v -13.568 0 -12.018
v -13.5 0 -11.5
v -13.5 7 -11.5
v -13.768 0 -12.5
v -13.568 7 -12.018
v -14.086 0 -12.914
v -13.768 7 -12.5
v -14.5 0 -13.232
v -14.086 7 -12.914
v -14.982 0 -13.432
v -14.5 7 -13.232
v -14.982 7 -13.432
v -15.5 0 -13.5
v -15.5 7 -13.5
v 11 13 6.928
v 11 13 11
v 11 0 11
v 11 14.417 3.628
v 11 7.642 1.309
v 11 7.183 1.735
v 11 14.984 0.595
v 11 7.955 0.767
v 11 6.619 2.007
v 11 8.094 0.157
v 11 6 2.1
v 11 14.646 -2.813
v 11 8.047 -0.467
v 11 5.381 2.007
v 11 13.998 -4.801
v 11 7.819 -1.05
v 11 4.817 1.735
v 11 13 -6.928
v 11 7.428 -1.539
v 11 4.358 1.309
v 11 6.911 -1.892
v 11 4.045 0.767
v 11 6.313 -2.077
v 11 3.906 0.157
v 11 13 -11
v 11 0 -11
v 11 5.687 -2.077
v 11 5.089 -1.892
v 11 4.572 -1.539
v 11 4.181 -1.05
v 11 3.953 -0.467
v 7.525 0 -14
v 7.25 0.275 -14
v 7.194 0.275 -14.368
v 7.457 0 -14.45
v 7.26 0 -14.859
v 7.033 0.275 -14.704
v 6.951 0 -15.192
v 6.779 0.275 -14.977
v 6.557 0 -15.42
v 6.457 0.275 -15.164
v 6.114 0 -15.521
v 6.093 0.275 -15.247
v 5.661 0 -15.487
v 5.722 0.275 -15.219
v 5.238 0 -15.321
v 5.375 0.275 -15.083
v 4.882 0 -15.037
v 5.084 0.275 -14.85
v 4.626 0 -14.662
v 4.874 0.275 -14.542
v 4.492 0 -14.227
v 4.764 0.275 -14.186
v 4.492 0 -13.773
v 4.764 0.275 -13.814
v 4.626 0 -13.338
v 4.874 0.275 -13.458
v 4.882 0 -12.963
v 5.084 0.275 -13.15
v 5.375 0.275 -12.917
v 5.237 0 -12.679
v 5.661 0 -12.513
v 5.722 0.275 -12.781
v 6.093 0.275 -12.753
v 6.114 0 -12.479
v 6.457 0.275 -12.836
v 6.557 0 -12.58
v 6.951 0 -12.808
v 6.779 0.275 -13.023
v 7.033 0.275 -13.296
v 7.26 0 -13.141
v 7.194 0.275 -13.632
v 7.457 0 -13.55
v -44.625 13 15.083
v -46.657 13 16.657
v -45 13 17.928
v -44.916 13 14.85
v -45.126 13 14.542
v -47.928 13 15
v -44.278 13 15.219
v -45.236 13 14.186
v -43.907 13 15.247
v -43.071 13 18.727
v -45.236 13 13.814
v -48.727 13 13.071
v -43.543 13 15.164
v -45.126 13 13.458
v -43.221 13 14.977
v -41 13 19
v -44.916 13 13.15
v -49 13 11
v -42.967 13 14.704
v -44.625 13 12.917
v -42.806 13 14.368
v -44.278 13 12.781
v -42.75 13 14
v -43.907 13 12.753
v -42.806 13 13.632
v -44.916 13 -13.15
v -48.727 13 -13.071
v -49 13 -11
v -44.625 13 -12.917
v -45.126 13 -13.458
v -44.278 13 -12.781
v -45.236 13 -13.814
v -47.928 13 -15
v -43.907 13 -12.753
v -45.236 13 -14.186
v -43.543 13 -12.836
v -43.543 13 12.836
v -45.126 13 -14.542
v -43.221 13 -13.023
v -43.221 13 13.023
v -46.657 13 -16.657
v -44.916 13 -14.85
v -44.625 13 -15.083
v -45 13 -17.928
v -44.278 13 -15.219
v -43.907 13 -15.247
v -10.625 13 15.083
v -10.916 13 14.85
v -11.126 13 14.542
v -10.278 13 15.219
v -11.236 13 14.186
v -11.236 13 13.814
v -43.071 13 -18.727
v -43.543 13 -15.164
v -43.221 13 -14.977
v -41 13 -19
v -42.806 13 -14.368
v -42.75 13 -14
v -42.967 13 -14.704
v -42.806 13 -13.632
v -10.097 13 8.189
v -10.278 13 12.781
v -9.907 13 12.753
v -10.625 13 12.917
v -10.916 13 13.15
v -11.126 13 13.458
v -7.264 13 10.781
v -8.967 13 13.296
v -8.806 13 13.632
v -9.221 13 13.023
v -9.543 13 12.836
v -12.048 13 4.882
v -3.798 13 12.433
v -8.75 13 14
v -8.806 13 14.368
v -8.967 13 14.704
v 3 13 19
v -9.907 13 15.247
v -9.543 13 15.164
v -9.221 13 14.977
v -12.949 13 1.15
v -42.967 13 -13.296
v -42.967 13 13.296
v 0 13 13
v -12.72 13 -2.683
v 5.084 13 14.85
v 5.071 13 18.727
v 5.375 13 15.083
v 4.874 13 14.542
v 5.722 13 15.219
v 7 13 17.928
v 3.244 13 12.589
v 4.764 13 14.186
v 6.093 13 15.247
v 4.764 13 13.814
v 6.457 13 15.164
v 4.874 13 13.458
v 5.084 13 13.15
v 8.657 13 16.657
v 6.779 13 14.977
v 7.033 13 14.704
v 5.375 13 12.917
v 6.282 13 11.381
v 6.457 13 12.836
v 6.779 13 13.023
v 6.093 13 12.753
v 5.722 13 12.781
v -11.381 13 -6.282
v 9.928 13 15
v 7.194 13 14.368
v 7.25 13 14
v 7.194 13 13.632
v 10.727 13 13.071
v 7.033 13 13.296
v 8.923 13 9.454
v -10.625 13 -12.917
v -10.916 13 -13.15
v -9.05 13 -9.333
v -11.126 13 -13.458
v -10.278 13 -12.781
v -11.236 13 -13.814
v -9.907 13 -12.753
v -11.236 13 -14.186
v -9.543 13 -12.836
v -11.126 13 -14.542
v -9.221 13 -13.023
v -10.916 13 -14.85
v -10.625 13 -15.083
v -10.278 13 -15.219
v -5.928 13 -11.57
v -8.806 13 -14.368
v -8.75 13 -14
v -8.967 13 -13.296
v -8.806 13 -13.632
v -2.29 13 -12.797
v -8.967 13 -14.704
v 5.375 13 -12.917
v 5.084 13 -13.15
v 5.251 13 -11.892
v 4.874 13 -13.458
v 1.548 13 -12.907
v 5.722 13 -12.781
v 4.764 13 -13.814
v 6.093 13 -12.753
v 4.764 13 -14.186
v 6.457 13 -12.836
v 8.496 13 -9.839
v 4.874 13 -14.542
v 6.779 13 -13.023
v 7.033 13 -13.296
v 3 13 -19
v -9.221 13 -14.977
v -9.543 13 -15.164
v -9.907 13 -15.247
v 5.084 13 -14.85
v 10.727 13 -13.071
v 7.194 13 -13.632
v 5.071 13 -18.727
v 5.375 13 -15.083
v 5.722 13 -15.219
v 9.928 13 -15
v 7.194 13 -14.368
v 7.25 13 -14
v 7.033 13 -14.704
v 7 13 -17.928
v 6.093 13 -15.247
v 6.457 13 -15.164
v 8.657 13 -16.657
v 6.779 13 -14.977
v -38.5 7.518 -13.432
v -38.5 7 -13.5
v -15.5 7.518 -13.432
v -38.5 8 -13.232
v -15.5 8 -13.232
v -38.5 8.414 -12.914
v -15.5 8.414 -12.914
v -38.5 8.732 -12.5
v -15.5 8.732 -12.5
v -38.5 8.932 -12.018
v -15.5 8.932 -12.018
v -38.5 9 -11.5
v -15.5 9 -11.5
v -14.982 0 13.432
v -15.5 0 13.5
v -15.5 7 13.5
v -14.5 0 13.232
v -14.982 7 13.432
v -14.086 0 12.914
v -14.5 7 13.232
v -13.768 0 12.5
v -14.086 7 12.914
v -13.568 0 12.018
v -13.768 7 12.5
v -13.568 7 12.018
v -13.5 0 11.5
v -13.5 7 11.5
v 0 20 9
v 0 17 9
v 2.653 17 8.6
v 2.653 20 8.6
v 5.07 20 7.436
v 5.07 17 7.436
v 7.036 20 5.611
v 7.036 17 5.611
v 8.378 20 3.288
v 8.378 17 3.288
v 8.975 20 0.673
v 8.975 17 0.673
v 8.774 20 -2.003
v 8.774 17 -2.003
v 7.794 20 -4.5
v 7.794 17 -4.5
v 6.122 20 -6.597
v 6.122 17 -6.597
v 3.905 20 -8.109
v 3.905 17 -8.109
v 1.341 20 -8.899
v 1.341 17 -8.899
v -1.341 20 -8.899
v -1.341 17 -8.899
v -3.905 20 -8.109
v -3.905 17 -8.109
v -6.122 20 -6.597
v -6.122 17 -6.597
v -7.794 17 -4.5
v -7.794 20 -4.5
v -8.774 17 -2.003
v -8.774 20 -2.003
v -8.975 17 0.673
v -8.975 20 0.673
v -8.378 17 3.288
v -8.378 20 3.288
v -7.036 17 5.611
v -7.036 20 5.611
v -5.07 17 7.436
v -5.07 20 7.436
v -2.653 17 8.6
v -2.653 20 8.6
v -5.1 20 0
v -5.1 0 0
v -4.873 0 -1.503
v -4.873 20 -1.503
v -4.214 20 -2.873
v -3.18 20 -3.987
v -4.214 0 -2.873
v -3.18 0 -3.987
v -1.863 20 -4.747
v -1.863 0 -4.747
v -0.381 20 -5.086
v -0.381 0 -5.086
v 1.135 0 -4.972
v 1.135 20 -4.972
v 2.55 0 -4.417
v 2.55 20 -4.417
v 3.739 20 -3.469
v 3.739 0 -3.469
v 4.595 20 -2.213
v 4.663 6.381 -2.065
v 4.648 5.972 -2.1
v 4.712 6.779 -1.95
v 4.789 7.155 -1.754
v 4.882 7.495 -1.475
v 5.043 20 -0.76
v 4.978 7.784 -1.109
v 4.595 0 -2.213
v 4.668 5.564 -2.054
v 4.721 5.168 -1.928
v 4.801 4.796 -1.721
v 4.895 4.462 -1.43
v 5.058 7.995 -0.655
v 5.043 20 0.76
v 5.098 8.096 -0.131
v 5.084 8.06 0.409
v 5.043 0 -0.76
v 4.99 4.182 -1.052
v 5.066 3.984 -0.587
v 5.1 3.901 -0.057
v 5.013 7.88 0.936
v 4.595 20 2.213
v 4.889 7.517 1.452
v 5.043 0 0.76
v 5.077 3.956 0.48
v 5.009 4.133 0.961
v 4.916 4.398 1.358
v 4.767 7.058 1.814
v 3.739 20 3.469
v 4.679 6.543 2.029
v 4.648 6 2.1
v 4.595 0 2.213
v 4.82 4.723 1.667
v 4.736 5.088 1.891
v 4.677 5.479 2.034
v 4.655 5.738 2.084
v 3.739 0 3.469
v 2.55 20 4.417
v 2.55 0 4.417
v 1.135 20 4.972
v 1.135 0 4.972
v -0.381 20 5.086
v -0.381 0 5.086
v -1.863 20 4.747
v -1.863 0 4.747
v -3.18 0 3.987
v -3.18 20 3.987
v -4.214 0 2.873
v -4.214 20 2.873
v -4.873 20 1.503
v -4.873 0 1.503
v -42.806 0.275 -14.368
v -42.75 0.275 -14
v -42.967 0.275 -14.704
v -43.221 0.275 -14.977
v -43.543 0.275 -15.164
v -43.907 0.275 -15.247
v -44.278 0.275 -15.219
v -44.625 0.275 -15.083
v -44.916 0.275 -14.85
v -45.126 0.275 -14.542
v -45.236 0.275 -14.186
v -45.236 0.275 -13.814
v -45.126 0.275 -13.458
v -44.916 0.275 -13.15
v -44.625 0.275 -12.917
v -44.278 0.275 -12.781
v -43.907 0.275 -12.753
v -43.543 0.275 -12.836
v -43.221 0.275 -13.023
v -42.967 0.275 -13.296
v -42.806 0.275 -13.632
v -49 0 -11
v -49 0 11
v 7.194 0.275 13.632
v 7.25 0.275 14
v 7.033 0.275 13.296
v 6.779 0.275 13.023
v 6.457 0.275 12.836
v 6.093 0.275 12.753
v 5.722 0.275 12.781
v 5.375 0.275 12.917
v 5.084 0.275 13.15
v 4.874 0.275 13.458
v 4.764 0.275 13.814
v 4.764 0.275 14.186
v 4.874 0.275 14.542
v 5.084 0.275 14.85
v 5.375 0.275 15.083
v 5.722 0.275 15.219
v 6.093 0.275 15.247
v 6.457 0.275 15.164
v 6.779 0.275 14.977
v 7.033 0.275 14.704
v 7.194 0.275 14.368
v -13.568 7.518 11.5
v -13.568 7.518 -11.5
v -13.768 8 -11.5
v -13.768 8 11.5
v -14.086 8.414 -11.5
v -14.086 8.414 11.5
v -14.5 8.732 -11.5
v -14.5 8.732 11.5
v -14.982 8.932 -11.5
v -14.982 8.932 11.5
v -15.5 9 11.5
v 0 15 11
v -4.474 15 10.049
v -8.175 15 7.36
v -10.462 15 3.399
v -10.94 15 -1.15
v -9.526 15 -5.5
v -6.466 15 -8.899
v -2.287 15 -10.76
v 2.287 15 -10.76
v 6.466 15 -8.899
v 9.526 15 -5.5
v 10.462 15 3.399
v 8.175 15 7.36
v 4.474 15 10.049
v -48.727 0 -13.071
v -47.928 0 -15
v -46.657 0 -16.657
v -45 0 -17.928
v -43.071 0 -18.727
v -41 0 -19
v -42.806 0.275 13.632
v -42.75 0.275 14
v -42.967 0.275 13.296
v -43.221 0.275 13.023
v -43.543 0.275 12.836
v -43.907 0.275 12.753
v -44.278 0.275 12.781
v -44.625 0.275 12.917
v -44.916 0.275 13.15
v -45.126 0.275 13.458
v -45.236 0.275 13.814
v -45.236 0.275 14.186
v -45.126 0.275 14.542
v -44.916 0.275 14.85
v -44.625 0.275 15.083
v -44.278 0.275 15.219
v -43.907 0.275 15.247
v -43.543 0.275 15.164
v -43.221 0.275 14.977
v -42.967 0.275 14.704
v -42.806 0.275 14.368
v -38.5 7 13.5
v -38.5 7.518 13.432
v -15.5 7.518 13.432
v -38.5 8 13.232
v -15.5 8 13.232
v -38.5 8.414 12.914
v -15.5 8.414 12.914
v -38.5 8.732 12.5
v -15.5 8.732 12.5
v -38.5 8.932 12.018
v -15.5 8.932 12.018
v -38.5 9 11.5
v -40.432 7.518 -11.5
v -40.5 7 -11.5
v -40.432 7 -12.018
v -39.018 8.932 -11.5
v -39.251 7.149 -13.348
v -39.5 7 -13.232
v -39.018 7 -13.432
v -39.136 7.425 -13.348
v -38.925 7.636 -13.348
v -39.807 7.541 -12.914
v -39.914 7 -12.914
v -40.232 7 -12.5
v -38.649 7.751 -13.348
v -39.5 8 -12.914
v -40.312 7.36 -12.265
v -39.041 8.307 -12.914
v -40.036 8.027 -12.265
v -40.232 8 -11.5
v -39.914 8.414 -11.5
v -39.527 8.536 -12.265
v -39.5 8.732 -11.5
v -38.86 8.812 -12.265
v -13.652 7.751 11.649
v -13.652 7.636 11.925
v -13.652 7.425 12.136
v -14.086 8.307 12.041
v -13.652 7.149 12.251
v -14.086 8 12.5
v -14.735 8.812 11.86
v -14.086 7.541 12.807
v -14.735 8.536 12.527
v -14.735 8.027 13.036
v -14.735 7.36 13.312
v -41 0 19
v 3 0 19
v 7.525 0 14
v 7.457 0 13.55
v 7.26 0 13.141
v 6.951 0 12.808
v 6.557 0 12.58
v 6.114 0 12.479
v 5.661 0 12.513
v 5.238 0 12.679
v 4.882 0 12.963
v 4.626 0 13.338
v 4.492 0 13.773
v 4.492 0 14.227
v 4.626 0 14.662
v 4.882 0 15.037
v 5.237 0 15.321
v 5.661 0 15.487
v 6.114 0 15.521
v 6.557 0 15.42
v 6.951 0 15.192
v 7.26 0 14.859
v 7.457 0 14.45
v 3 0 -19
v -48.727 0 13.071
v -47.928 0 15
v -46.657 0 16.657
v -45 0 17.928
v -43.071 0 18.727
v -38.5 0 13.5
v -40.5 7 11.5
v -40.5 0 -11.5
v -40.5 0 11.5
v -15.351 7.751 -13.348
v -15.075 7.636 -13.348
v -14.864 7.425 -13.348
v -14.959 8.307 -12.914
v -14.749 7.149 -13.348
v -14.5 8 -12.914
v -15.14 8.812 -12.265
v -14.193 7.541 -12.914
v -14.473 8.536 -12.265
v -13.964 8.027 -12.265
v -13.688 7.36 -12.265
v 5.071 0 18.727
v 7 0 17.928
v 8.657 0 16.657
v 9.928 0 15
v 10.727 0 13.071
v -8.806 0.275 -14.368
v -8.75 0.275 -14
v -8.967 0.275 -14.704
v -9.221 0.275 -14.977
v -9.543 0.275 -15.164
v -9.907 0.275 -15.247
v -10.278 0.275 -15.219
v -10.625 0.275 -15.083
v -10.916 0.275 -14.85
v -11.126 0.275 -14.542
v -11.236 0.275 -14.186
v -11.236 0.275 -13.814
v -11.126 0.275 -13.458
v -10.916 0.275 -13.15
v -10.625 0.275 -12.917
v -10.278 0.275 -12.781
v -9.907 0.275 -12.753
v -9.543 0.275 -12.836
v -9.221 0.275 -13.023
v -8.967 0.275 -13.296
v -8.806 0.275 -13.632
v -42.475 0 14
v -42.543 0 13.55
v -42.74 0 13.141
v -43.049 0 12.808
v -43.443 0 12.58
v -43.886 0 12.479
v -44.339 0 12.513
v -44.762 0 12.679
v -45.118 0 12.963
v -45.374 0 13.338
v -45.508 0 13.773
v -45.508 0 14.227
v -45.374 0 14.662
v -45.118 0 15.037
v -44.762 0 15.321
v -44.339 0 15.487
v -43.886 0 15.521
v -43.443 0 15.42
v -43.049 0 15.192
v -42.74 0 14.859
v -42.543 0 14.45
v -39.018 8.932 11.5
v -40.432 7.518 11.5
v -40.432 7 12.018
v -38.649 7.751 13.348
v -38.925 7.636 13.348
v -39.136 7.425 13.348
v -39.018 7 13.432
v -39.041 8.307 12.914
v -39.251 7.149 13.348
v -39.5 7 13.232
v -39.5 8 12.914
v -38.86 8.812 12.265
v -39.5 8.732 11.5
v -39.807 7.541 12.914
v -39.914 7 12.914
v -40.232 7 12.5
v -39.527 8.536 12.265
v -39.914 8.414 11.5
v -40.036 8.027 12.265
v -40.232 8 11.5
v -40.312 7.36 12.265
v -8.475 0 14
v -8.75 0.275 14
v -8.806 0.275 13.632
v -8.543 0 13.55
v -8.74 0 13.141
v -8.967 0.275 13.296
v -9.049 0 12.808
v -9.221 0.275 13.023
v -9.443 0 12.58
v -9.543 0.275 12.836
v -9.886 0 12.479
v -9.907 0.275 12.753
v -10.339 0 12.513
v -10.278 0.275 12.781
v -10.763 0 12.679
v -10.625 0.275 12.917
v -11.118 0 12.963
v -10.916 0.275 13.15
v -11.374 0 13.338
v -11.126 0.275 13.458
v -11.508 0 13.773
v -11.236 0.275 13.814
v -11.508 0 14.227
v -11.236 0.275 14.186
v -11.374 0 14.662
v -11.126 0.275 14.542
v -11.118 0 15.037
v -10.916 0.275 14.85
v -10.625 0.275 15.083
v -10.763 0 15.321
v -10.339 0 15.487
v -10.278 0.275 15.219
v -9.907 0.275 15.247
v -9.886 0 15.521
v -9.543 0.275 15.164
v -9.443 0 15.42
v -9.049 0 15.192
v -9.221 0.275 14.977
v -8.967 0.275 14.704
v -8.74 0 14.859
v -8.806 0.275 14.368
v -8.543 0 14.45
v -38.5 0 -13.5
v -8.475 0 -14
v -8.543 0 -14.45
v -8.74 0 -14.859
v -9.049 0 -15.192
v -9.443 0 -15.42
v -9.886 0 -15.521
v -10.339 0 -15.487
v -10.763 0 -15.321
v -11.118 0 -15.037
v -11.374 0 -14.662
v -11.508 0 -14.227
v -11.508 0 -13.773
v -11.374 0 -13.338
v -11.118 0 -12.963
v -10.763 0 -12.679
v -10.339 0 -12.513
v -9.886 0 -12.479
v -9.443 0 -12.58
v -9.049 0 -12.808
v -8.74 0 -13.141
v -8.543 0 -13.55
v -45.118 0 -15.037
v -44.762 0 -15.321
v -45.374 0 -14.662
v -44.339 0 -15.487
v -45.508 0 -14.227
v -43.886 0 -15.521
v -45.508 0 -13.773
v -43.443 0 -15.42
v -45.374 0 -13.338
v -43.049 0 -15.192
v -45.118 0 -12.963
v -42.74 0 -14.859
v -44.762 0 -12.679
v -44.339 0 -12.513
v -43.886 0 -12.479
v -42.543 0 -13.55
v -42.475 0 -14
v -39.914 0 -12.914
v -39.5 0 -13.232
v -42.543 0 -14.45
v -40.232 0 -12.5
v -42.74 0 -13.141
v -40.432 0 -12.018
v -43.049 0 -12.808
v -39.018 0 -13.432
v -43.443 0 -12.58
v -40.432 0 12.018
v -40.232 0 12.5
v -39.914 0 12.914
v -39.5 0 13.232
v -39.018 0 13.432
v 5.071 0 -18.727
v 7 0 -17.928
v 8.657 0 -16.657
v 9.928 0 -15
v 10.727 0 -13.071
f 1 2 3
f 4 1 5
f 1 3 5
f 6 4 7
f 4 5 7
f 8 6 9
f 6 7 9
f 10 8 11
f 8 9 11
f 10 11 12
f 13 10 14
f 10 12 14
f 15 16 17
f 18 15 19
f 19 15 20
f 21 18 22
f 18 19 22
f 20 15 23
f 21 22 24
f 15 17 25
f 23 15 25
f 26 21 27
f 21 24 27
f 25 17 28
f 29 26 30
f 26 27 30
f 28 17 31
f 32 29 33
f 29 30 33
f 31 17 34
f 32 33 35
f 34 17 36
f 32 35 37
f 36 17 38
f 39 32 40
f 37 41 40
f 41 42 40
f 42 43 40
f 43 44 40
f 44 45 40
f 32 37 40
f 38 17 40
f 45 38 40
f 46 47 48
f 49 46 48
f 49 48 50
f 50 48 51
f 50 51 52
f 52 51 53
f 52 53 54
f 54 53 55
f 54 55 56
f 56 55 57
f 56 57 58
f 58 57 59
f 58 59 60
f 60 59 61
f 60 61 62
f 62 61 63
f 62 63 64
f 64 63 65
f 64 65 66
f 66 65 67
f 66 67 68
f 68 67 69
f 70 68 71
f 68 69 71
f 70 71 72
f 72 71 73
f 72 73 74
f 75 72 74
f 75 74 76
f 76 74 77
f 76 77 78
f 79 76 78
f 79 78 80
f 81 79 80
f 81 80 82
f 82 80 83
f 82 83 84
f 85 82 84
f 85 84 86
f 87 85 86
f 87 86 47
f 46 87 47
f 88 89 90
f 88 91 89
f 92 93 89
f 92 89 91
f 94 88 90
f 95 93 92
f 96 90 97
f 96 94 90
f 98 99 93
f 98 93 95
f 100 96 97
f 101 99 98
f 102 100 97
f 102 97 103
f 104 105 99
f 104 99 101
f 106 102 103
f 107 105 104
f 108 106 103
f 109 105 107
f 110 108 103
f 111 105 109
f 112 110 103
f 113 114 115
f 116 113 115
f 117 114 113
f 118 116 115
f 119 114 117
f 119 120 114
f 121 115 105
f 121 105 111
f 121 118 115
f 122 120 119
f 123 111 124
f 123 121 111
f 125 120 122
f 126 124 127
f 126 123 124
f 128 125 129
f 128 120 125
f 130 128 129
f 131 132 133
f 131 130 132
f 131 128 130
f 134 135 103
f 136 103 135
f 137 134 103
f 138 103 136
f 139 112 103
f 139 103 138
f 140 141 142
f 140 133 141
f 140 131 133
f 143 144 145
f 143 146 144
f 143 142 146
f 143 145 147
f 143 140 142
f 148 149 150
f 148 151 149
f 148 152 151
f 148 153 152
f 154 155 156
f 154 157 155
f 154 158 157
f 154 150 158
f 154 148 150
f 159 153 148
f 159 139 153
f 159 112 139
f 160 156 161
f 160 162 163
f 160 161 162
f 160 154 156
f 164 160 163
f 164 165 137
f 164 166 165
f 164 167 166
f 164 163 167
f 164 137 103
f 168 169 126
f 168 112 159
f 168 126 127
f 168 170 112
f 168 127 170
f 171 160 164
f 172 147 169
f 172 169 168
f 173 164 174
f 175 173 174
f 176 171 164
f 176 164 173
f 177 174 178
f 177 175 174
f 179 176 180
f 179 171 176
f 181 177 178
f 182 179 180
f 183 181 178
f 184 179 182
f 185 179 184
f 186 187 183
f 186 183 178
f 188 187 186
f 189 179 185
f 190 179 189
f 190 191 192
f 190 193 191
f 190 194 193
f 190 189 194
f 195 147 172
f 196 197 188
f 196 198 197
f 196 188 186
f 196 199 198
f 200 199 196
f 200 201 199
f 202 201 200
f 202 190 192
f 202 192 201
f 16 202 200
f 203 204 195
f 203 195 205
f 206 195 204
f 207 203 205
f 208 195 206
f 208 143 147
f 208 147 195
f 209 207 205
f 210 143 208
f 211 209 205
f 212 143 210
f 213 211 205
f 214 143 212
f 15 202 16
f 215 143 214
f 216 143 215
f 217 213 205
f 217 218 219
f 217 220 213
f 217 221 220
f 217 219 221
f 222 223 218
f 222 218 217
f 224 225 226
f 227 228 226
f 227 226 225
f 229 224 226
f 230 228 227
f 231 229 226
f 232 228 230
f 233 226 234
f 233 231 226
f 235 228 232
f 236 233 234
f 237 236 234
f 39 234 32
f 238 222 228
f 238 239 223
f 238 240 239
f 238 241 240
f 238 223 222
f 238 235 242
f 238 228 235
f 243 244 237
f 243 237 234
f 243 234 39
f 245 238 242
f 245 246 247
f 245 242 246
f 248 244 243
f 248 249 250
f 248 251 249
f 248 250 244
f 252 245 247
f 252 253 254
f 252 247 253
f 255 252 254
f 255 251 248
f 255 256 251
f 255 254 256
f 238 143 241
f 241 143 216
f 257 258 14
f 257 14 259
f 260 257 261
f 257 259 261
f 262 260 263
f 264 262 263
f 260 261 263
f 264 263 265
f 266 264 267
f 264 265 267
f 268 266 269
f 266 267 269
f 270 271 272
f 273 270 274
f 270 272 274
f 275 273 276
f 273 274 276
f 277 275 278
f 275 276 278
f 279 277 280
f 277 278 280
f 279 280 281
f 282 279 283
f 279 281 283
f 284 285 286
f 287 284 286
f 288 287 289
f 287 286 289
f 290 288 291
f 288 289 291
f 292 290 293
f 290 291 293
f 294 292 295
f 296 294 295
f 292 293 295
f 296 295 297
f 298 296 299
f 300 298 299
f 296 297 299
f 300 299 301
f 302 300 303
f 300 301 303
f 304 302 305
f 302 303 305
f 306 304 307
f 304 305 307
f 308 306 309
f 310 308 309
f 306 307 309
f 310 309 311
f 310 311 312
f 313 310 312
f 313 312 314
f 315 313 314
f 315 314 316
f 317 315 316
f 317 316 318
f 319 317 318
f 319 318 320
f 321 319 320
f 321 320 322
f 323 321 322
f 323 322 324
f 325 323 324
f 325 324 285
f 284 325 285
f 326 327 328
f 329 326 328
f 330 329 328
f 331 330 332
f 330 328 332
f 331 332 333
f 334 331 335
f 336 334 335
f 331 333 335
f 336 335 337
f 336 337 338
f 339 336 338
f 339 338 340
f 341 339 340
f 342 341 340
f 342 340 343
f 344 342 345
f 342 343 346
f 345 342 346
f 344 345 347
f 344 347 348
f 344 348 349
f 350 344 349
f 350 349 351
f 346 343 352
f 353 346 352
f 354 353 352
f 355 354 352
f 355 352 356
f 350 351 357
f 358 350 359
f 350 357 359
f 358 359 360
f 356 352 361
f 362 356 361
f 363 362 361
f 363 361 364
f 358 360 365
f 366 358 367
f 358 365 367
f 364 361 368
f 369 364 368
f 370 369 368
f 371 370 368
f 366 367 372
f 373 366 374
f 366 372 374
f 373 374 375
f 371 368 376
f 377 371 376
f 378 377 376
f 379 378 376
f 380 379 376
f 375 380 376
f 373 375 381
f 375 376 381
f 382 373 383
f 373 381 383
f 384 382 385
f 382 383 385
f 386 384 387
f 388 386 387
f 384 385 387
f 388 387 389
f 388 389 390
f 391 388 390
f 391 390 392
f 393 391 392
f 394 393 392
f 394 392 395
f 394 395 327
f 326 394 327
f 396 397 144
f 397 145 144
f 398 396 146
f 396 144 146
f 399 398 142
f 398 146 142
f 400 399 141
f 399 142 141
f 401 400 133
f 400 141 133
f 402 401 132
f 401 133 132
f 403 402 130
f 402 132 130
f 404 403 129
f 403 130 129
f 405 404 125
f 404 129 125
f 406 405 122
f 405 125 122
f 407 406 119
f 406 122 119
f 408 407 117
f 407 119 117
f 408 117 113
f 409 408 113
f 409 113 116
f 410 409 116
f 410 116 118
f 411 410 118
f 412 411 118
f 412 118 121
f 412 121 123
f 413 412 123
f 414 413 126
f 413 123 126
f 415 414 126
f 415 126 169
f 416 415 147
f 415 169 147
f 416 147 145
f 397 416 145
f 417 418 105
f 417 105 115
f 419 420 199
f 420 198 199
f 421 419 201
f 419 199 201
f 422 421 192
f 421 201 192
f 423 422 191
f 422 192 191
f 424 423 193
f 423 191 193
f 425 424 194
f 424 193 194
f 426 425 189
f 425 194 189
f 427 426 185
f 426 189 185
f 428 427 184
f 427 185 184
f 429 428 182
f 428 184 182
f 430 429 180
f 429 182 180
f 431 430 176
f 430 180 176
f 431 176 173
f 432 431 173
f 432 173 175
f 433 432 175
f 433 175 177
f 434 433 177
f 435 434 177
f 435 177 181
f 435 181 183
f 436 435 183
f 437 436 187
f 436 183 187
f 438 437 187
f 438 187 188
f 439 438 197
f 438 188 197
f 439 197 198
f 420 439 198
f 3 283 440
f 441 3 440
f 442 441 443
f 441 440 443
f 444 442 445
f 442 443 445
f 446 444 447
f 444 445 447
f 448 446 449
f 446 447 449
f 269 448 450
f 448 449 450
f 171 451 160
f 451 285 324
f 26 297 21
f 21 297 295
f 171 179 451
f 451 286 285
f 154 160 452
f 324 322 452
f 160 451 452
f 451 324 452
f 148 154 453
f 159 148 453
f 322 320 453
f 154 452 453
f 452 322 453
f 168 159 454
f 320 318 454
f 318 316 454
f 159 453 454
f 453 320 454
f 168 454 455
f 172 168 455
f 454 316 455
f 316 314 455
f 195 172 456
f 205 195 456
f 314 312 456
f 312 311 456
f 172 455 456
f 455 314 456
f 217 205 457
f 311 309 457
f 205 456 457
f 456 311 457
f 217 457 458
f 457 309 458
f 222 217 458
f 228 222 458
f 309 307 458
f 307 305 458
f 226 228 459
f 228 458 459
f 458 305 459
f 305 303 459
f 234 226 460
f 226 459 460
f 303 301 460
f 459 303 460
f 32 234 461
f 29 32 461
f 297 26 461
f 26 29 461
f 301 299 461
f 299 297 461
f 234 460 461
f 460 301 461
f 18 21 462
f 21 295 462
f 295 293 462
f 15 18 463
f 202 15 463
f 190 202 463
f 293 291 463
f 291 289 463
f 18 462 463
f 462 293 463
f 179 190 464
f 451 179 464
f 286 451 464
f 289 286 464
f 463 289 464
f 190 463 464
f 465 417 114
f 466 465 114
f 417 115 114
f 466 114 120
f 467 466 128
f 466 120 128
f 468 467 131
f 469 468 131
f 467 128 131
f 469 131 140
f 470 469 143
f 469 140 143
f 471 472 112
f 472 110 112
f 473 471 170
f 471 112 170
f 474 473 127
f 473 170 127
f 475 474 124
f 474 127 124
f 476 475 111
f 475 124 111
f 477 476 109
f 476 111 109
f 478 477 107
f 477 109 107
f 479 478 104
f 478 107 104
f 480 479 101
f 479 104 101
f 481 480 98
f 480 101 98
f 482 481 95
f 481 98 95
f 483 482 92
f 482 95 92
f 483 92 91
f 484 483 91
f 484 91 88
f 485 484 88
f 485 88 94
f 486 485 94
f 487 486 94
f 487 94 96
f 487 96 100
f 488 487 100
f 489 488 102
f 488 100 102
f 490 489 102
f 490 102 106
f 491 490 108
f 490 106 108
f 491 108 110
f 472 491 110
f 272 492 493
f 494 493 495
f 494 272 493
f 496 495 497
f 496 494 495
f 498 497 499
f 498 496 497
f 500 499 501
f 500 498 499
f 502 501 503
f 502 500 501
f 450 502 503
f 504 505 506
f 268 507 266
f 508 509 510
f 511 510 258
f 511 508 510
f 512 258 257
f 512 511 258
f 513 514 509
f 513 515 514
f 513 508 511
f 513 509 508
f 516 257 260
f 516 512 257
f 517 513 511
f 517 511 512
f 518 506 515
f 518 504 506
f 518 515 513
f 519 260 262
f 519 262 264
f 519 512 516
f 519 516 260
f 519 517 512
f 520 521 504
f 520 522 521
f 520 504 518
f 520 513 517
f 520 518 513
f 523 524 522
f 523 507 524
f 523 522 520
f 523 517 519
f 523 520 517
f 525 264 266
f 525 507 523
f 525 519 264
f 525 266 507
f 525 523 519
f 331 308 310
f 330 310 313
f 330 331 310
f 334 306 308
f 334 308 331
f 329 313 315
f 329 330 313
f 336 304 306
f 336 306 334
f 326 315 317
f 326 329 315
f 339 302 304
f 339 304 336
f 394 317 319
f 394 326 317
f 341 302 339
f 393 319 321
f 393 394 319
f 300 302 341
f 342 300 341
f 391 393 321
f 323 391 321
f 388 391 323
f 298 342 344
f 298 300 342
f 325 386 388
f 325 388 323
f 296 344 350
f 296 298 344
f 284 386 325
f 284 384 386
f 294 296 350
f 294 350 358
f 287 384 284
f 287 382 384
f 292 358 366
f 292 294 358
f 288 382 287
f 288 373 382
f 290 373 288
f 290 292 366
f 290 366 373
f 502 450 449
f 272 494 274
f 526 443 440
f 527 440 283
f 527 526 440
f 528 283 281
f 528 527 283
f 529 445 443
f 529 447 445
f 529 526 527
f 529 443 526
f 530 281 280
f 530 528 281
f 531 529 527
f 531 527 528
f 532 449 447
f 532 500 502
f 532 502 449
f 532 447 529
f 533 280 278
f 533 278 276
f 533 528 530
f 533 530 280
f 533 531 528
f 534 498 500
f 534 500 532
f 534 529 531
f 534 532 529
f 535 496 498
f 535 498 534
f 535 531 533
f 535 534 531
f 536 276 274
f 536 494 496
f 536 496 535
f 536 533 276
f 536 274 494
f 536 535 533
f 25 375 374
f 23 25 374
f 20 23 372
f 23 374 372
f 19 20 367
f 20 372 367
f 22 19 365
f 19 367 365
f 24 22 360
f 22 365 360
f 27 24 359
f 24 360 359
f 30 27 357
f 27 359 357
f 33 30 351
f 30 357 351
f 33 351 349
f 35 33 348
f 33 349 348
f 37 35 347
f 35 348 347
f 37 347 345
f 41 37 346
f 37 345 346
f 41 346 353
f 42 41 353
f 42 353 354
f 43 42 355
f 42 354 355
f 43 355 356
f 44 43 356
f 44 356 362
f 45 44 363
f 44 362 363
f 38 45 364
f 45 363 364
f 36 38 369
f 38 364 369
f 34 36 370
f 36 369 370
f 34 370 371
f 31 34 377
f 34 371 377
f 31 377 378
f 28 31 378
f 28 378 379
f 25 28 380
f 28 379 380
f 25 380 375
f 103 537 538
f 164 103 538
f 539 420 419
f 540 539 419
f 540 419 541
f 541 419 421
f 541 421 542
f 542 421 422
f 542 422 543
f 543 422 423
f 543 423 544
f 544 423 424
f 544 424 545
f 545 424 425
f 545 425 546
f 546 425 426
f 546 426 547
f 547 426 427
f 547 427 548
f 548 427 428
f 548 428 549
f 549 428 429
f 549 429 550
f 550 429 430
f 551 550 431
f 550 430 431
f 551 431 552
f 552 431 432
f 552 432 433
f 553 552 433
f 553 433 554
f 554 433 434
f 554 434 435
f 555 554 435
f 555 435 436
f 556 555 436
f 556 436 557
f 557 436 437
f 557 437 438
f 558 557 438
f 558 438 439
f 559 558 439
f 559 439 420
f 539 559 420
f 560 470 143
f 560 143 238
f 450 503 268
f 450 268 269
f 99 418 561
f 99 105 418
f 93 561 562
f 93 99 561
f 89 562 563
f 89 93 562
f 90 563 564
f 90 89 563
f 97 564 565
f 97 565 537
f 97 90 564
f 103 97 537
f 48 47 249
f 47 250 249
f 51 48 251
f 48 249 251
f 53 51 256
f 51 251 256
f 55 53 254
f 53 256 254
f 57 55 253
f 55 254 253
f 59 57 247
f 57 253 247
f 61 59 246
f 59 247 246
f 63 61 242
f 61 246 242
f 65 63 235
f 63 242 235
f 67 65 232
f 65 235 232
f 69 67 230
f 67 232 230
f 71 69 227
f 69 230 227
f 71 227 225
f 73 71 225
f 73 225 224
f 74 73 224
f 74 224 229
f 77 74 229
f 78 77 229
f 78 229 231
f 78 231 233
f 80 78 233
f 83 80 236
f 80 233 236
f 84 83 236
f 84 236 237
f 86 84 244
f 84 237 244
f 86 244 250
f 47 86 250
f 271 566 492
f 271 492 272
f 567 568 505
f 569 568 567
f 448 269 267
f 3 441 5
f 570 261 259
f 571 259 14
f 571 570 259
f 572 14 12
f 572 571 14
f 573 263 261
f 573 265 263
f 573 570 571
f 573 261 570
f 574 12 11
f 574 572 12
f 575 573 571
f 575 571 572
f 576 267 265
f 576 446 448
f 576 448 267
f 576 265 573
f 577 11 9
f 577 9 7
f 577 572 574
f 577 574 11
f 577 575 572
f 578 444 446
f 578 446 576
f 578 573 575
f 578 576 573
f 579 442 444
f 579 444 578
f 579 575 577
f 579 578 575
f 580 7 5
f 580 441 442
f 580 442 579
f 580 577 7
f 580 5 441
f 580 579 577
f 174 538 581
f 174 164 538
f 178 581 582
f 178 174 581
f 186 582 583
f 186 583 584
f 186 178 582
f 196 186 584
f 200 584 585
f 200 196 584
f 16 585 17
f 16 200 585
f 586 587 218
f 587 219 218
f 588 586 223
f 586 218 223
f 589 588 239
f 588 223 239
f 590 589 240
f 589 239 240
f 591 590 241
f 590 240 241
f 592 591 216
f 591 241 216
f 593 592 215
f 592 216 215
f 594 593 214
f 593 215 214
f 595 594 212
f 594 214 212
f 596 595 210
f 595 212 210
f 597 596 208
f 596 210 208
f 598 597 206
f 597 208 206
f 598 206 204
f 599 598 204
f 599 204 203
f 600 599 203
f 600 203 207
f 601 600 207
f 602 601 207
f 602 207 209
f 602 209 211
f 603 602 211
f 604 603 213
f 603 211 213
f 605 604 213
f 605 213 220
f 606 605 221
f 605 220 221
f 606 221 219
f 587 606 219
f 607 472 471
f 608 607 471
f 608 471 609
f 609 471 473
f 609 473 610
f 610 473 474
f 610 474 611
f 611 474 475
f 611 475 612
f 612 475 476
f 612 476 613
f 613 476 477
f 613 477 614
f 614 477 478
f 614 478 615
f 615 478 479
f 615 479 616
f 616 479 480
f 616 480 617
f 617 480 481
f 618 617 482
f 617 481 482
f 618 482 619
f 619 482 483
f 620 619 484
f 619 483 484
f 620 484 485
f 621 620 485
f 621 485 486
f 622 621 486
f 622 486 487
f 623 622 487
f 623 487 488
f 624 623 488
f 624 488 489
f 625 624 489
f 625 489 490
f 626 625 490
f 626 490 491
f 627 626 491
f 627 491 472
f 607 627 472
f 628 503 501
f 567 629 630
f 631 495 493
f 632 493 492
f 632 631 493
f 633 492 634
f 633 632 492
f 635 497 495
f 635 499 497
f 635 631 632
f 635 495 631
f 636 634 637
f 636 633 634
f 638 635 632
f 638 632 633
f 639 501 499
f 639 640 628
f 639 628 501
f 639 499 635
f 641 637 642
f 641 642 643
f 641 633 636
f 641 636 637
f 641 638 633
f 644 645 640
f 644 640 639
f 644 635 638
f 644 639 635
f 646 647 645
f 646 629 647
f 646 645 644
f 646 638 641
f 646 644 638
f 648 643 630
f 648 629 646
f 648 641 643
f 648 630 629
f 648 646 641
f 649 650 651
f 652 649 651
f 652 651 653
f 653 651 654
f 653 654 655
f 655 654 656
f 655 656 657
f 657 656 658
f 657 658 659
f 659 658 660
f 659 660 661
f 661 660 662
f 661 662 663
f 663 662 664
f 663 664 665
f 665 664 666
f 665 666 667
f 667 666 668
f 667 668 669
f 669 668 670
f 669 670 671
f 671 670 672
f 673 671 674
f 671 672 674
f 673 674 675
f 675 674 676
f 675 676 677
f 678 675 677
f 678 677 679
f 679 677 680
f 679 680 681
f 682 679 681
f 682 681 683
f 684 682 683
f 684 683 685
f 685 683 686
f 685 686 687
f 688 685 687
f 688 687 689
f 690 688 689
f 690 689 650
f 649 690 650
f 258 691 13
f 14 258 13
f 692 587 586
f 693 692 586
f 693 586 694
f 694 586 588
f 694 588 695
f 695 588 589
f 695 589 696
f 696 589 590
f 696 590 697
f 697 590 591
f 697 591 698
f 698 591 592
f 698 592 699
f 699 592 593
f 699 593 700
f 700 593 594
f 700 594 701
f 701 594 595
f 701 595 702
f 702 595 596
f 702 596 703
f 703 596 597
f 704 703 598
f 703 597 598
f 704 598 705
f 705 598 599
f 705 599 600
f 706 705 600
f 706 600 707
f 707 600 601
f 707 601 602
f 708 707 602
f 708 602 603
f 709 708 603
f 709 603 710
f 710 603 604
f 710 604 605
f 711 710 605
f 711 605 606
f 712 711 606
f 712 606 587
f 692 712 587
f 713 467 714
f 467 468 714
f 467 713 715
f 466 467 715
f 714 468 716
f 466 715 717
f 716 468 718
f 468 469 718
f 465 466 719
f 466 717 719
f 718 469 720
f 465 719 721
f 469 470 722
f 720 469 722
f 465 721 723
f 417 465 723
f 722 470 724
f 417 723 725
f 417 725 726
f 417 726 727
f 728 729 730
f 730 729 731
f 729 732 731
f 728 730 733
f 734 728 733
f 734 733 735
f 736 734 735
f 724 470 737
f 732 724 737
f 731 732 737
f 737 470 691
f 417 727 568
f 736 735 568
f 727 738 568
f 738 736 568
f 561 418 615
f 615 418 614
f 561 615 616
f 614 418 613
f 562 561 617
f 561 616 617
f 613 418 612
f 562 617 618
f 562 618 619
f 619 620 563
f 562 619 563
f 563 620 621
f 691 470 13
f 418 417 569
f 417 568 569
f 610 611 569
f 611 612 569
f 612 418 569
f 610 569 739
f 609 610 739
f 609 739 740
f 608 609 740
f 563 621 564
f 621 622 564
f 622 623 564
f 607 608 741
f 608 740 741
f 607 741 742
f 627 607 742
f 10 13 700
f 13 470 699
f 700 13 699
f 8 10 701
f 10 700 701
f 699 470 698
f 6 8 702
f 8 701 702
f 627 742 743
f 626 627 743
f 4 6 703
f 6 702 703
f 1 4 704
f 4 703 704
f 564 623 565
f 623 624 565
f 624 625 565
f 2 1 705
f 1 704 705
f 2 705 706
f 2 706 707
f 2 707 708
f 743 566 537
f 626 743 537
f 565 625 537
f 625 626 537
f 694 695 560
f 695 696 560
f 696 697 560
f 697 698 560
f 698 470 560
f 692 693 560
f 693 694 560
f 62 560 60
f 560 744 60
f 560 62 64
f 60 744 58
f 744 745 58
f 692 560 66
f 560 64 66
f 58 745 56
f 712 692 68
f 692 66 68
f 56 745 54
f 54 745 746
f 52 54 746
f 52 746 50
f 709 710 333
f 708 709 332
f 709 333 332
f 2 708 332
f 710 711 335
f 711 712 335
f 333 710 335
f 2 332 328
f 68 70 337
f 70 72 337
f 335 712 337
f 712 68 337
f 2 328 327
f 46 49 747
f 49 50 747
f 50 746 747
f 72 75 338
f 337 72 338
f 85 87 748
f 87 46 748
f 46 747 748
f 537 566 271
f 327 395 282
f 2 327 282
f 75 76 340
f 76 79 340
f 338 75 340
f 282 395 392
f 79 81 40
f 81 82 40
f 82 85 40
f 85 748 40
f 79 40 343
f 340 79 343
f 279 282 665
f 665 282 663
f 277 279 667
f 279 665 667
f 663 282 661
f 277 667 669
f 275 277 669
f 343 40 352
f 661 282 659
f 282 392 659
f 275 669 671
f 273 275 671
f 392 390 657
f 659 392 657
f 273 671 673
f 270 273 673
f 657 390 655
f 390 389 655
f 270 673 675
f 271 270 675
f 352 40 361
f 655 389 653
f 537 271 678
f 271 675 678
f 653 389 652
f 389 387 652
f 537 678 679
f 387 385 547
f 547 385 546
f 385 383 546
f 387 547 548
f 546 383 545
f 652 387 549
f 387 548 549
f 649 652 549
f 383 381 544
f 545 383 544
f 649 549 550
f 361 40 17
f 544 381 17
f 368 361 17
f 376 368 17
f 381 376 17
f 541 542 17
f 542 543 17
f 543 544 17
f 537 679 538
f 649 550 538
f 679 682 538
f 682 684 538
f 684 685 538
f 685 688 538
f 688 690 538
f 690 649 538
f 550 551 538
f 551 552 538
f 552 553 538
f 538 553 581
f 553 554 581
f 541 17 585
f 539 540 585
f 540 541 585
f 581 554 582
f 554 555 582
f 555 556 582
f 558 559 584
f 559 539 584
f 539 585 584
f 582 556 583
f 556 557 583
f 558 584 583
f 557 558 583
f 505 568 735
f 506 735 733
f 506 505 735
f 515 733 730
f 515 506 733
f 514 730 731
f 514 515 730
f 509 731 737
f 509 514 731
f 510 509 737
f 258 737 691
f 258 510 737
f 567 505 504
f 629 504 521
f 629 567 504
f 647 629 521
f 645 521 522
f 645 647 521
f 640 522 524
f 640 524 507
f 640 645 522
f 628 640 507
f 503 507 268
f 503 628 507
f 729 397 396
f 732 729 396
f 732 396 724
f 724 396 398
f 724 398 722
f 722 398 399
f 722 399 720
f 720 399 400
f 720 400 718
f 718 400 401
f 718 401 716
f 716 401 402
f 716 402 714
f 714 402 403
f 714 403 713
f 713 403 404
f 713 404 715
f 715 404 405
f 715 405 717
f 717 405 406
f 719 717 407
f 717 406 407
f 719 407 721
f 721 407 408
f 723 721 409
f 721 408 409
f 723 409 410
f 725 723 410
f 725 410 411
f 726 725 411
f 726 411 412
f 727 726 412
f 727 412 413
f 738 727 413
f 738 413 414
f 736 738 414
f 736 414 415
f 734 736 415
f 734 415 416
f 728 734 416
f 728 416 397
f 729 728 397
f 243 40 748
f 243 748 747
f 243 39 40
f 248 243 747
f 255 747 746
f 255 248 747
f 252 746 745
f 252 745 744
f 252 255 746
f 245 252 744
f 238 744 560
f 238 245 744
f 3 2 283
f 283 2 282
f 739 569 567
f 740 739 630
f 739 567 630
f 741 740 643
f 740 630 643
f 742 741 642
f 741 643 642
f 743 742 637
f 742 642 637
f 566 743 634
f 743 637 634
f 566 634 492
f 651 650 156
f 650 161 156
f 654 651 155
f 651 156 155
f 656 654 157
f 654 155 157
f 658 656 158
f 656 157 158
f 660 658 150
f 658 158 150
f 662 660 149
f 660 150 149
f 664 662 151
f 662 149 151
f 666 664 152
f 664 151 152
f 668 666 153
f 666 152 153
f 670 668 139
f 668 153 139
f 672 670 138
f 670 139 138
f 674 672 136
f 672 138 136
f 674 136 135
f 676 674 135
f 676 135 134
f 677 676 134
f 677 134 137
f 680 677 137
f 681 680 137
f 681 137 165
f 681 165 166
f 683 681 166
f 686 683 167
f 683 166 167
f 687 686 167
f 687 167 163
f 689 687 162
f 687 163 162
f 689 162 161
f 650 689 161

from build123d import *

# Parameters (mm, degrees)
SKETCH1_W                               = 60
SKETCH1_H                               = 38
BASE_DEPTH                              = 13
ADDALITTLEBEAUTY_R                      = 8
SKETCH1_3_R                             = 9
RODHOLDER_DEPTH                         = 20
M5X0_8_TAPPED_HOLE_FOR_FIXING_ROD_D     = 4.2
M5X0_8_TAPPED_HOLE_FOR_FIXING_ROD_DEPTH = 10.4
M5X0_8_TAPPED_HOLE_FOR_FIXING_ROD_TIP   = 1.2618073
CHAMFER1_SIZE                           = 4
F_10_2_10_2_ROD_HOLE_D                  = 10.2
M3X0_5_TAPPED_HOLE1_D                   = 2.5
M3X0_5_TAPPED_HOLE1_CSINK_D             = 3.05
M3X0_5_TAPPED_HOLE1_CSINK_ANGLE         = 90
SKETCH9_W                               = 27
SKETCH9_H                               = 27
CUT_EXTRUDE1_DEPTH                      = 9
FILLET1_R                               = 2


with BuildPart() as part:
    # Sketch1 → Base (new body)
    with BuildSketch(Plane(origin=(0, 0, 0), x_dir=(1, 0, 0), z_dir=(0, 1, 0))):
        with Locations((-19, 0)):
            Rectangle(SKETCH1_W, SKETCH1_H)
    extrude(amount=BASE_DEPTH)

    # AddALittleBeauty
    addalittlebeauty_edges = [part.edges().sort_by_distance(p)[0] for p in [
        (11, 6.5, -19),
        (11, 6.5, 19),
        (-49, 6.5, 19),
        (-49, 6.5, -19),
    ]]
    fillet(addalittlebeauty_edges, radius=ADDALITTLEBEAUTY_R)

    # Sketch1<3> → RodHolder (add)
    with BuildSketch(Plane(origin=(0, 0, 0), x_dir=(1, 0, 0), z_dir=(0, 1, 0))):
        with Locations(Location((0, 0, 0), (0, 0, 270))):
            Circle(SKETCH1_3_R)
    extrude(amount=RODHOLDER_DEPTH)

    # M5x0.8 Tapped Hole for fixing rod
    with Locations(Plane(origin=(11, 0, 0), x_dir=(0, 0, -1), z_dir=(1, 0, 0))):
        with Locations((0, 6)):
            Hole(M5X0_8_TAPPED_HOLE_FOR_FIXING_ROD_D / 2, depth=M5X0_8_TAPPED_HOLE_FOR_FIXING_ROD_DEPTH)
            with Locations((0, 0, -(M5X0_8_TAPPED_HOLE_FOR_FIXING_ROD_DEPTH + M5X0_8_TAPPED_HOLE_FOR_FIXING_ROD_TIP / 2))):  # 118° drill point
                Cone(0, M5X0_8_TAPPED_HOLE_FOR_FIXING_ROD_D / 2, M5X0_8_TAPPED_HOLE_FOR_FIXING_ROD_TIP, mode=Mode.SUBTRACT)

    # Chamfer1
    # the kernel refuses this chamfer: 4 mm, written as the material it adds along each edge
    with BuildSketch(Plane(origin=(0, 13, 0), x_dir=(0, 0, 1), z_dir=(1, 0, 0))) as chamfer1_piece_1_section:
        Polygon((9 + CHAMFER1_SIZE, 0), (9, -CHAMFER1_SIZE), (9, 0), align=None)
    chamfer1_piece_1 = revolve(axis=Axis((0, 13, 0), (0, -1, 0)), mode=Mode.PRIVATE)
    chamfer1_piece_1 = split(chamfer1_piece_1, bisect_by=Plane(origin=(11, 14.941949716, -10.941949716), z_dir=(-1, 0, 0)), keep=Keep.TOP, mode=Mode.PRIVATE)
    add(chamfer1_piece_1)

    # Ø10.2 (10.2) Rod Hole (through all)
    with Locations(Plane(origin=(0, 20, 0), x_dir=(1, 0, 0), z_dir=(0, 1, 0))):
        with Locations((0, 0)):
            Hole(F_10_2_10_2_ROD_HOLE_D / 2)

    # M3x0.5 Tapped Hole1 (through all)
    with Locations(Plane(origin=(0, 0, 0), x_dir=(-1, 0, 0), z_dir=(0, -1, 0))):
        with Locations((-6, 14), (-6, -14), (44, -14), (44, 14), (10, 14), (10, -14)):
            CounterSinkHole(M3X0_5_TAPPED_HOLE1_D / 2, M3X0_5_TAPPED_HOLE1_CSINK_D / 2, counter_sink_angle=M3X0_5_TAPPED_HOLE1_CSINK_ANGLE)

    # Sketch9 → Cut-Extrude1 (cut)
    with BuildSketch(Plane.XZ):
        with Locations((-27, 0)):
            Rectangle(SKETCH9_W, SKETCH9_H)
    extrude(amount=-CUT_EXTRUDE1_DEPTH, mode=Mode.SUBTRACT)

    # Fillet1
    fillet1_edges = [part.edges().sort_by_distance(p)[0] for p in [
        (-40.5, 9, 0),
        (-40.5, 4.5, -13.5),
        (-27, 9, 13.5),
        (-40.5, 4.5, 13.5),
        (-13.5, 9, 0),
        (-13.5, 4.5, 13.5),
        (-27, 9, -13.5),
        (-13.5, 4.5, -13.5),
    ]]
    fillet(fillet1_edges, radius=FILLET1_R)


solid = part.part
